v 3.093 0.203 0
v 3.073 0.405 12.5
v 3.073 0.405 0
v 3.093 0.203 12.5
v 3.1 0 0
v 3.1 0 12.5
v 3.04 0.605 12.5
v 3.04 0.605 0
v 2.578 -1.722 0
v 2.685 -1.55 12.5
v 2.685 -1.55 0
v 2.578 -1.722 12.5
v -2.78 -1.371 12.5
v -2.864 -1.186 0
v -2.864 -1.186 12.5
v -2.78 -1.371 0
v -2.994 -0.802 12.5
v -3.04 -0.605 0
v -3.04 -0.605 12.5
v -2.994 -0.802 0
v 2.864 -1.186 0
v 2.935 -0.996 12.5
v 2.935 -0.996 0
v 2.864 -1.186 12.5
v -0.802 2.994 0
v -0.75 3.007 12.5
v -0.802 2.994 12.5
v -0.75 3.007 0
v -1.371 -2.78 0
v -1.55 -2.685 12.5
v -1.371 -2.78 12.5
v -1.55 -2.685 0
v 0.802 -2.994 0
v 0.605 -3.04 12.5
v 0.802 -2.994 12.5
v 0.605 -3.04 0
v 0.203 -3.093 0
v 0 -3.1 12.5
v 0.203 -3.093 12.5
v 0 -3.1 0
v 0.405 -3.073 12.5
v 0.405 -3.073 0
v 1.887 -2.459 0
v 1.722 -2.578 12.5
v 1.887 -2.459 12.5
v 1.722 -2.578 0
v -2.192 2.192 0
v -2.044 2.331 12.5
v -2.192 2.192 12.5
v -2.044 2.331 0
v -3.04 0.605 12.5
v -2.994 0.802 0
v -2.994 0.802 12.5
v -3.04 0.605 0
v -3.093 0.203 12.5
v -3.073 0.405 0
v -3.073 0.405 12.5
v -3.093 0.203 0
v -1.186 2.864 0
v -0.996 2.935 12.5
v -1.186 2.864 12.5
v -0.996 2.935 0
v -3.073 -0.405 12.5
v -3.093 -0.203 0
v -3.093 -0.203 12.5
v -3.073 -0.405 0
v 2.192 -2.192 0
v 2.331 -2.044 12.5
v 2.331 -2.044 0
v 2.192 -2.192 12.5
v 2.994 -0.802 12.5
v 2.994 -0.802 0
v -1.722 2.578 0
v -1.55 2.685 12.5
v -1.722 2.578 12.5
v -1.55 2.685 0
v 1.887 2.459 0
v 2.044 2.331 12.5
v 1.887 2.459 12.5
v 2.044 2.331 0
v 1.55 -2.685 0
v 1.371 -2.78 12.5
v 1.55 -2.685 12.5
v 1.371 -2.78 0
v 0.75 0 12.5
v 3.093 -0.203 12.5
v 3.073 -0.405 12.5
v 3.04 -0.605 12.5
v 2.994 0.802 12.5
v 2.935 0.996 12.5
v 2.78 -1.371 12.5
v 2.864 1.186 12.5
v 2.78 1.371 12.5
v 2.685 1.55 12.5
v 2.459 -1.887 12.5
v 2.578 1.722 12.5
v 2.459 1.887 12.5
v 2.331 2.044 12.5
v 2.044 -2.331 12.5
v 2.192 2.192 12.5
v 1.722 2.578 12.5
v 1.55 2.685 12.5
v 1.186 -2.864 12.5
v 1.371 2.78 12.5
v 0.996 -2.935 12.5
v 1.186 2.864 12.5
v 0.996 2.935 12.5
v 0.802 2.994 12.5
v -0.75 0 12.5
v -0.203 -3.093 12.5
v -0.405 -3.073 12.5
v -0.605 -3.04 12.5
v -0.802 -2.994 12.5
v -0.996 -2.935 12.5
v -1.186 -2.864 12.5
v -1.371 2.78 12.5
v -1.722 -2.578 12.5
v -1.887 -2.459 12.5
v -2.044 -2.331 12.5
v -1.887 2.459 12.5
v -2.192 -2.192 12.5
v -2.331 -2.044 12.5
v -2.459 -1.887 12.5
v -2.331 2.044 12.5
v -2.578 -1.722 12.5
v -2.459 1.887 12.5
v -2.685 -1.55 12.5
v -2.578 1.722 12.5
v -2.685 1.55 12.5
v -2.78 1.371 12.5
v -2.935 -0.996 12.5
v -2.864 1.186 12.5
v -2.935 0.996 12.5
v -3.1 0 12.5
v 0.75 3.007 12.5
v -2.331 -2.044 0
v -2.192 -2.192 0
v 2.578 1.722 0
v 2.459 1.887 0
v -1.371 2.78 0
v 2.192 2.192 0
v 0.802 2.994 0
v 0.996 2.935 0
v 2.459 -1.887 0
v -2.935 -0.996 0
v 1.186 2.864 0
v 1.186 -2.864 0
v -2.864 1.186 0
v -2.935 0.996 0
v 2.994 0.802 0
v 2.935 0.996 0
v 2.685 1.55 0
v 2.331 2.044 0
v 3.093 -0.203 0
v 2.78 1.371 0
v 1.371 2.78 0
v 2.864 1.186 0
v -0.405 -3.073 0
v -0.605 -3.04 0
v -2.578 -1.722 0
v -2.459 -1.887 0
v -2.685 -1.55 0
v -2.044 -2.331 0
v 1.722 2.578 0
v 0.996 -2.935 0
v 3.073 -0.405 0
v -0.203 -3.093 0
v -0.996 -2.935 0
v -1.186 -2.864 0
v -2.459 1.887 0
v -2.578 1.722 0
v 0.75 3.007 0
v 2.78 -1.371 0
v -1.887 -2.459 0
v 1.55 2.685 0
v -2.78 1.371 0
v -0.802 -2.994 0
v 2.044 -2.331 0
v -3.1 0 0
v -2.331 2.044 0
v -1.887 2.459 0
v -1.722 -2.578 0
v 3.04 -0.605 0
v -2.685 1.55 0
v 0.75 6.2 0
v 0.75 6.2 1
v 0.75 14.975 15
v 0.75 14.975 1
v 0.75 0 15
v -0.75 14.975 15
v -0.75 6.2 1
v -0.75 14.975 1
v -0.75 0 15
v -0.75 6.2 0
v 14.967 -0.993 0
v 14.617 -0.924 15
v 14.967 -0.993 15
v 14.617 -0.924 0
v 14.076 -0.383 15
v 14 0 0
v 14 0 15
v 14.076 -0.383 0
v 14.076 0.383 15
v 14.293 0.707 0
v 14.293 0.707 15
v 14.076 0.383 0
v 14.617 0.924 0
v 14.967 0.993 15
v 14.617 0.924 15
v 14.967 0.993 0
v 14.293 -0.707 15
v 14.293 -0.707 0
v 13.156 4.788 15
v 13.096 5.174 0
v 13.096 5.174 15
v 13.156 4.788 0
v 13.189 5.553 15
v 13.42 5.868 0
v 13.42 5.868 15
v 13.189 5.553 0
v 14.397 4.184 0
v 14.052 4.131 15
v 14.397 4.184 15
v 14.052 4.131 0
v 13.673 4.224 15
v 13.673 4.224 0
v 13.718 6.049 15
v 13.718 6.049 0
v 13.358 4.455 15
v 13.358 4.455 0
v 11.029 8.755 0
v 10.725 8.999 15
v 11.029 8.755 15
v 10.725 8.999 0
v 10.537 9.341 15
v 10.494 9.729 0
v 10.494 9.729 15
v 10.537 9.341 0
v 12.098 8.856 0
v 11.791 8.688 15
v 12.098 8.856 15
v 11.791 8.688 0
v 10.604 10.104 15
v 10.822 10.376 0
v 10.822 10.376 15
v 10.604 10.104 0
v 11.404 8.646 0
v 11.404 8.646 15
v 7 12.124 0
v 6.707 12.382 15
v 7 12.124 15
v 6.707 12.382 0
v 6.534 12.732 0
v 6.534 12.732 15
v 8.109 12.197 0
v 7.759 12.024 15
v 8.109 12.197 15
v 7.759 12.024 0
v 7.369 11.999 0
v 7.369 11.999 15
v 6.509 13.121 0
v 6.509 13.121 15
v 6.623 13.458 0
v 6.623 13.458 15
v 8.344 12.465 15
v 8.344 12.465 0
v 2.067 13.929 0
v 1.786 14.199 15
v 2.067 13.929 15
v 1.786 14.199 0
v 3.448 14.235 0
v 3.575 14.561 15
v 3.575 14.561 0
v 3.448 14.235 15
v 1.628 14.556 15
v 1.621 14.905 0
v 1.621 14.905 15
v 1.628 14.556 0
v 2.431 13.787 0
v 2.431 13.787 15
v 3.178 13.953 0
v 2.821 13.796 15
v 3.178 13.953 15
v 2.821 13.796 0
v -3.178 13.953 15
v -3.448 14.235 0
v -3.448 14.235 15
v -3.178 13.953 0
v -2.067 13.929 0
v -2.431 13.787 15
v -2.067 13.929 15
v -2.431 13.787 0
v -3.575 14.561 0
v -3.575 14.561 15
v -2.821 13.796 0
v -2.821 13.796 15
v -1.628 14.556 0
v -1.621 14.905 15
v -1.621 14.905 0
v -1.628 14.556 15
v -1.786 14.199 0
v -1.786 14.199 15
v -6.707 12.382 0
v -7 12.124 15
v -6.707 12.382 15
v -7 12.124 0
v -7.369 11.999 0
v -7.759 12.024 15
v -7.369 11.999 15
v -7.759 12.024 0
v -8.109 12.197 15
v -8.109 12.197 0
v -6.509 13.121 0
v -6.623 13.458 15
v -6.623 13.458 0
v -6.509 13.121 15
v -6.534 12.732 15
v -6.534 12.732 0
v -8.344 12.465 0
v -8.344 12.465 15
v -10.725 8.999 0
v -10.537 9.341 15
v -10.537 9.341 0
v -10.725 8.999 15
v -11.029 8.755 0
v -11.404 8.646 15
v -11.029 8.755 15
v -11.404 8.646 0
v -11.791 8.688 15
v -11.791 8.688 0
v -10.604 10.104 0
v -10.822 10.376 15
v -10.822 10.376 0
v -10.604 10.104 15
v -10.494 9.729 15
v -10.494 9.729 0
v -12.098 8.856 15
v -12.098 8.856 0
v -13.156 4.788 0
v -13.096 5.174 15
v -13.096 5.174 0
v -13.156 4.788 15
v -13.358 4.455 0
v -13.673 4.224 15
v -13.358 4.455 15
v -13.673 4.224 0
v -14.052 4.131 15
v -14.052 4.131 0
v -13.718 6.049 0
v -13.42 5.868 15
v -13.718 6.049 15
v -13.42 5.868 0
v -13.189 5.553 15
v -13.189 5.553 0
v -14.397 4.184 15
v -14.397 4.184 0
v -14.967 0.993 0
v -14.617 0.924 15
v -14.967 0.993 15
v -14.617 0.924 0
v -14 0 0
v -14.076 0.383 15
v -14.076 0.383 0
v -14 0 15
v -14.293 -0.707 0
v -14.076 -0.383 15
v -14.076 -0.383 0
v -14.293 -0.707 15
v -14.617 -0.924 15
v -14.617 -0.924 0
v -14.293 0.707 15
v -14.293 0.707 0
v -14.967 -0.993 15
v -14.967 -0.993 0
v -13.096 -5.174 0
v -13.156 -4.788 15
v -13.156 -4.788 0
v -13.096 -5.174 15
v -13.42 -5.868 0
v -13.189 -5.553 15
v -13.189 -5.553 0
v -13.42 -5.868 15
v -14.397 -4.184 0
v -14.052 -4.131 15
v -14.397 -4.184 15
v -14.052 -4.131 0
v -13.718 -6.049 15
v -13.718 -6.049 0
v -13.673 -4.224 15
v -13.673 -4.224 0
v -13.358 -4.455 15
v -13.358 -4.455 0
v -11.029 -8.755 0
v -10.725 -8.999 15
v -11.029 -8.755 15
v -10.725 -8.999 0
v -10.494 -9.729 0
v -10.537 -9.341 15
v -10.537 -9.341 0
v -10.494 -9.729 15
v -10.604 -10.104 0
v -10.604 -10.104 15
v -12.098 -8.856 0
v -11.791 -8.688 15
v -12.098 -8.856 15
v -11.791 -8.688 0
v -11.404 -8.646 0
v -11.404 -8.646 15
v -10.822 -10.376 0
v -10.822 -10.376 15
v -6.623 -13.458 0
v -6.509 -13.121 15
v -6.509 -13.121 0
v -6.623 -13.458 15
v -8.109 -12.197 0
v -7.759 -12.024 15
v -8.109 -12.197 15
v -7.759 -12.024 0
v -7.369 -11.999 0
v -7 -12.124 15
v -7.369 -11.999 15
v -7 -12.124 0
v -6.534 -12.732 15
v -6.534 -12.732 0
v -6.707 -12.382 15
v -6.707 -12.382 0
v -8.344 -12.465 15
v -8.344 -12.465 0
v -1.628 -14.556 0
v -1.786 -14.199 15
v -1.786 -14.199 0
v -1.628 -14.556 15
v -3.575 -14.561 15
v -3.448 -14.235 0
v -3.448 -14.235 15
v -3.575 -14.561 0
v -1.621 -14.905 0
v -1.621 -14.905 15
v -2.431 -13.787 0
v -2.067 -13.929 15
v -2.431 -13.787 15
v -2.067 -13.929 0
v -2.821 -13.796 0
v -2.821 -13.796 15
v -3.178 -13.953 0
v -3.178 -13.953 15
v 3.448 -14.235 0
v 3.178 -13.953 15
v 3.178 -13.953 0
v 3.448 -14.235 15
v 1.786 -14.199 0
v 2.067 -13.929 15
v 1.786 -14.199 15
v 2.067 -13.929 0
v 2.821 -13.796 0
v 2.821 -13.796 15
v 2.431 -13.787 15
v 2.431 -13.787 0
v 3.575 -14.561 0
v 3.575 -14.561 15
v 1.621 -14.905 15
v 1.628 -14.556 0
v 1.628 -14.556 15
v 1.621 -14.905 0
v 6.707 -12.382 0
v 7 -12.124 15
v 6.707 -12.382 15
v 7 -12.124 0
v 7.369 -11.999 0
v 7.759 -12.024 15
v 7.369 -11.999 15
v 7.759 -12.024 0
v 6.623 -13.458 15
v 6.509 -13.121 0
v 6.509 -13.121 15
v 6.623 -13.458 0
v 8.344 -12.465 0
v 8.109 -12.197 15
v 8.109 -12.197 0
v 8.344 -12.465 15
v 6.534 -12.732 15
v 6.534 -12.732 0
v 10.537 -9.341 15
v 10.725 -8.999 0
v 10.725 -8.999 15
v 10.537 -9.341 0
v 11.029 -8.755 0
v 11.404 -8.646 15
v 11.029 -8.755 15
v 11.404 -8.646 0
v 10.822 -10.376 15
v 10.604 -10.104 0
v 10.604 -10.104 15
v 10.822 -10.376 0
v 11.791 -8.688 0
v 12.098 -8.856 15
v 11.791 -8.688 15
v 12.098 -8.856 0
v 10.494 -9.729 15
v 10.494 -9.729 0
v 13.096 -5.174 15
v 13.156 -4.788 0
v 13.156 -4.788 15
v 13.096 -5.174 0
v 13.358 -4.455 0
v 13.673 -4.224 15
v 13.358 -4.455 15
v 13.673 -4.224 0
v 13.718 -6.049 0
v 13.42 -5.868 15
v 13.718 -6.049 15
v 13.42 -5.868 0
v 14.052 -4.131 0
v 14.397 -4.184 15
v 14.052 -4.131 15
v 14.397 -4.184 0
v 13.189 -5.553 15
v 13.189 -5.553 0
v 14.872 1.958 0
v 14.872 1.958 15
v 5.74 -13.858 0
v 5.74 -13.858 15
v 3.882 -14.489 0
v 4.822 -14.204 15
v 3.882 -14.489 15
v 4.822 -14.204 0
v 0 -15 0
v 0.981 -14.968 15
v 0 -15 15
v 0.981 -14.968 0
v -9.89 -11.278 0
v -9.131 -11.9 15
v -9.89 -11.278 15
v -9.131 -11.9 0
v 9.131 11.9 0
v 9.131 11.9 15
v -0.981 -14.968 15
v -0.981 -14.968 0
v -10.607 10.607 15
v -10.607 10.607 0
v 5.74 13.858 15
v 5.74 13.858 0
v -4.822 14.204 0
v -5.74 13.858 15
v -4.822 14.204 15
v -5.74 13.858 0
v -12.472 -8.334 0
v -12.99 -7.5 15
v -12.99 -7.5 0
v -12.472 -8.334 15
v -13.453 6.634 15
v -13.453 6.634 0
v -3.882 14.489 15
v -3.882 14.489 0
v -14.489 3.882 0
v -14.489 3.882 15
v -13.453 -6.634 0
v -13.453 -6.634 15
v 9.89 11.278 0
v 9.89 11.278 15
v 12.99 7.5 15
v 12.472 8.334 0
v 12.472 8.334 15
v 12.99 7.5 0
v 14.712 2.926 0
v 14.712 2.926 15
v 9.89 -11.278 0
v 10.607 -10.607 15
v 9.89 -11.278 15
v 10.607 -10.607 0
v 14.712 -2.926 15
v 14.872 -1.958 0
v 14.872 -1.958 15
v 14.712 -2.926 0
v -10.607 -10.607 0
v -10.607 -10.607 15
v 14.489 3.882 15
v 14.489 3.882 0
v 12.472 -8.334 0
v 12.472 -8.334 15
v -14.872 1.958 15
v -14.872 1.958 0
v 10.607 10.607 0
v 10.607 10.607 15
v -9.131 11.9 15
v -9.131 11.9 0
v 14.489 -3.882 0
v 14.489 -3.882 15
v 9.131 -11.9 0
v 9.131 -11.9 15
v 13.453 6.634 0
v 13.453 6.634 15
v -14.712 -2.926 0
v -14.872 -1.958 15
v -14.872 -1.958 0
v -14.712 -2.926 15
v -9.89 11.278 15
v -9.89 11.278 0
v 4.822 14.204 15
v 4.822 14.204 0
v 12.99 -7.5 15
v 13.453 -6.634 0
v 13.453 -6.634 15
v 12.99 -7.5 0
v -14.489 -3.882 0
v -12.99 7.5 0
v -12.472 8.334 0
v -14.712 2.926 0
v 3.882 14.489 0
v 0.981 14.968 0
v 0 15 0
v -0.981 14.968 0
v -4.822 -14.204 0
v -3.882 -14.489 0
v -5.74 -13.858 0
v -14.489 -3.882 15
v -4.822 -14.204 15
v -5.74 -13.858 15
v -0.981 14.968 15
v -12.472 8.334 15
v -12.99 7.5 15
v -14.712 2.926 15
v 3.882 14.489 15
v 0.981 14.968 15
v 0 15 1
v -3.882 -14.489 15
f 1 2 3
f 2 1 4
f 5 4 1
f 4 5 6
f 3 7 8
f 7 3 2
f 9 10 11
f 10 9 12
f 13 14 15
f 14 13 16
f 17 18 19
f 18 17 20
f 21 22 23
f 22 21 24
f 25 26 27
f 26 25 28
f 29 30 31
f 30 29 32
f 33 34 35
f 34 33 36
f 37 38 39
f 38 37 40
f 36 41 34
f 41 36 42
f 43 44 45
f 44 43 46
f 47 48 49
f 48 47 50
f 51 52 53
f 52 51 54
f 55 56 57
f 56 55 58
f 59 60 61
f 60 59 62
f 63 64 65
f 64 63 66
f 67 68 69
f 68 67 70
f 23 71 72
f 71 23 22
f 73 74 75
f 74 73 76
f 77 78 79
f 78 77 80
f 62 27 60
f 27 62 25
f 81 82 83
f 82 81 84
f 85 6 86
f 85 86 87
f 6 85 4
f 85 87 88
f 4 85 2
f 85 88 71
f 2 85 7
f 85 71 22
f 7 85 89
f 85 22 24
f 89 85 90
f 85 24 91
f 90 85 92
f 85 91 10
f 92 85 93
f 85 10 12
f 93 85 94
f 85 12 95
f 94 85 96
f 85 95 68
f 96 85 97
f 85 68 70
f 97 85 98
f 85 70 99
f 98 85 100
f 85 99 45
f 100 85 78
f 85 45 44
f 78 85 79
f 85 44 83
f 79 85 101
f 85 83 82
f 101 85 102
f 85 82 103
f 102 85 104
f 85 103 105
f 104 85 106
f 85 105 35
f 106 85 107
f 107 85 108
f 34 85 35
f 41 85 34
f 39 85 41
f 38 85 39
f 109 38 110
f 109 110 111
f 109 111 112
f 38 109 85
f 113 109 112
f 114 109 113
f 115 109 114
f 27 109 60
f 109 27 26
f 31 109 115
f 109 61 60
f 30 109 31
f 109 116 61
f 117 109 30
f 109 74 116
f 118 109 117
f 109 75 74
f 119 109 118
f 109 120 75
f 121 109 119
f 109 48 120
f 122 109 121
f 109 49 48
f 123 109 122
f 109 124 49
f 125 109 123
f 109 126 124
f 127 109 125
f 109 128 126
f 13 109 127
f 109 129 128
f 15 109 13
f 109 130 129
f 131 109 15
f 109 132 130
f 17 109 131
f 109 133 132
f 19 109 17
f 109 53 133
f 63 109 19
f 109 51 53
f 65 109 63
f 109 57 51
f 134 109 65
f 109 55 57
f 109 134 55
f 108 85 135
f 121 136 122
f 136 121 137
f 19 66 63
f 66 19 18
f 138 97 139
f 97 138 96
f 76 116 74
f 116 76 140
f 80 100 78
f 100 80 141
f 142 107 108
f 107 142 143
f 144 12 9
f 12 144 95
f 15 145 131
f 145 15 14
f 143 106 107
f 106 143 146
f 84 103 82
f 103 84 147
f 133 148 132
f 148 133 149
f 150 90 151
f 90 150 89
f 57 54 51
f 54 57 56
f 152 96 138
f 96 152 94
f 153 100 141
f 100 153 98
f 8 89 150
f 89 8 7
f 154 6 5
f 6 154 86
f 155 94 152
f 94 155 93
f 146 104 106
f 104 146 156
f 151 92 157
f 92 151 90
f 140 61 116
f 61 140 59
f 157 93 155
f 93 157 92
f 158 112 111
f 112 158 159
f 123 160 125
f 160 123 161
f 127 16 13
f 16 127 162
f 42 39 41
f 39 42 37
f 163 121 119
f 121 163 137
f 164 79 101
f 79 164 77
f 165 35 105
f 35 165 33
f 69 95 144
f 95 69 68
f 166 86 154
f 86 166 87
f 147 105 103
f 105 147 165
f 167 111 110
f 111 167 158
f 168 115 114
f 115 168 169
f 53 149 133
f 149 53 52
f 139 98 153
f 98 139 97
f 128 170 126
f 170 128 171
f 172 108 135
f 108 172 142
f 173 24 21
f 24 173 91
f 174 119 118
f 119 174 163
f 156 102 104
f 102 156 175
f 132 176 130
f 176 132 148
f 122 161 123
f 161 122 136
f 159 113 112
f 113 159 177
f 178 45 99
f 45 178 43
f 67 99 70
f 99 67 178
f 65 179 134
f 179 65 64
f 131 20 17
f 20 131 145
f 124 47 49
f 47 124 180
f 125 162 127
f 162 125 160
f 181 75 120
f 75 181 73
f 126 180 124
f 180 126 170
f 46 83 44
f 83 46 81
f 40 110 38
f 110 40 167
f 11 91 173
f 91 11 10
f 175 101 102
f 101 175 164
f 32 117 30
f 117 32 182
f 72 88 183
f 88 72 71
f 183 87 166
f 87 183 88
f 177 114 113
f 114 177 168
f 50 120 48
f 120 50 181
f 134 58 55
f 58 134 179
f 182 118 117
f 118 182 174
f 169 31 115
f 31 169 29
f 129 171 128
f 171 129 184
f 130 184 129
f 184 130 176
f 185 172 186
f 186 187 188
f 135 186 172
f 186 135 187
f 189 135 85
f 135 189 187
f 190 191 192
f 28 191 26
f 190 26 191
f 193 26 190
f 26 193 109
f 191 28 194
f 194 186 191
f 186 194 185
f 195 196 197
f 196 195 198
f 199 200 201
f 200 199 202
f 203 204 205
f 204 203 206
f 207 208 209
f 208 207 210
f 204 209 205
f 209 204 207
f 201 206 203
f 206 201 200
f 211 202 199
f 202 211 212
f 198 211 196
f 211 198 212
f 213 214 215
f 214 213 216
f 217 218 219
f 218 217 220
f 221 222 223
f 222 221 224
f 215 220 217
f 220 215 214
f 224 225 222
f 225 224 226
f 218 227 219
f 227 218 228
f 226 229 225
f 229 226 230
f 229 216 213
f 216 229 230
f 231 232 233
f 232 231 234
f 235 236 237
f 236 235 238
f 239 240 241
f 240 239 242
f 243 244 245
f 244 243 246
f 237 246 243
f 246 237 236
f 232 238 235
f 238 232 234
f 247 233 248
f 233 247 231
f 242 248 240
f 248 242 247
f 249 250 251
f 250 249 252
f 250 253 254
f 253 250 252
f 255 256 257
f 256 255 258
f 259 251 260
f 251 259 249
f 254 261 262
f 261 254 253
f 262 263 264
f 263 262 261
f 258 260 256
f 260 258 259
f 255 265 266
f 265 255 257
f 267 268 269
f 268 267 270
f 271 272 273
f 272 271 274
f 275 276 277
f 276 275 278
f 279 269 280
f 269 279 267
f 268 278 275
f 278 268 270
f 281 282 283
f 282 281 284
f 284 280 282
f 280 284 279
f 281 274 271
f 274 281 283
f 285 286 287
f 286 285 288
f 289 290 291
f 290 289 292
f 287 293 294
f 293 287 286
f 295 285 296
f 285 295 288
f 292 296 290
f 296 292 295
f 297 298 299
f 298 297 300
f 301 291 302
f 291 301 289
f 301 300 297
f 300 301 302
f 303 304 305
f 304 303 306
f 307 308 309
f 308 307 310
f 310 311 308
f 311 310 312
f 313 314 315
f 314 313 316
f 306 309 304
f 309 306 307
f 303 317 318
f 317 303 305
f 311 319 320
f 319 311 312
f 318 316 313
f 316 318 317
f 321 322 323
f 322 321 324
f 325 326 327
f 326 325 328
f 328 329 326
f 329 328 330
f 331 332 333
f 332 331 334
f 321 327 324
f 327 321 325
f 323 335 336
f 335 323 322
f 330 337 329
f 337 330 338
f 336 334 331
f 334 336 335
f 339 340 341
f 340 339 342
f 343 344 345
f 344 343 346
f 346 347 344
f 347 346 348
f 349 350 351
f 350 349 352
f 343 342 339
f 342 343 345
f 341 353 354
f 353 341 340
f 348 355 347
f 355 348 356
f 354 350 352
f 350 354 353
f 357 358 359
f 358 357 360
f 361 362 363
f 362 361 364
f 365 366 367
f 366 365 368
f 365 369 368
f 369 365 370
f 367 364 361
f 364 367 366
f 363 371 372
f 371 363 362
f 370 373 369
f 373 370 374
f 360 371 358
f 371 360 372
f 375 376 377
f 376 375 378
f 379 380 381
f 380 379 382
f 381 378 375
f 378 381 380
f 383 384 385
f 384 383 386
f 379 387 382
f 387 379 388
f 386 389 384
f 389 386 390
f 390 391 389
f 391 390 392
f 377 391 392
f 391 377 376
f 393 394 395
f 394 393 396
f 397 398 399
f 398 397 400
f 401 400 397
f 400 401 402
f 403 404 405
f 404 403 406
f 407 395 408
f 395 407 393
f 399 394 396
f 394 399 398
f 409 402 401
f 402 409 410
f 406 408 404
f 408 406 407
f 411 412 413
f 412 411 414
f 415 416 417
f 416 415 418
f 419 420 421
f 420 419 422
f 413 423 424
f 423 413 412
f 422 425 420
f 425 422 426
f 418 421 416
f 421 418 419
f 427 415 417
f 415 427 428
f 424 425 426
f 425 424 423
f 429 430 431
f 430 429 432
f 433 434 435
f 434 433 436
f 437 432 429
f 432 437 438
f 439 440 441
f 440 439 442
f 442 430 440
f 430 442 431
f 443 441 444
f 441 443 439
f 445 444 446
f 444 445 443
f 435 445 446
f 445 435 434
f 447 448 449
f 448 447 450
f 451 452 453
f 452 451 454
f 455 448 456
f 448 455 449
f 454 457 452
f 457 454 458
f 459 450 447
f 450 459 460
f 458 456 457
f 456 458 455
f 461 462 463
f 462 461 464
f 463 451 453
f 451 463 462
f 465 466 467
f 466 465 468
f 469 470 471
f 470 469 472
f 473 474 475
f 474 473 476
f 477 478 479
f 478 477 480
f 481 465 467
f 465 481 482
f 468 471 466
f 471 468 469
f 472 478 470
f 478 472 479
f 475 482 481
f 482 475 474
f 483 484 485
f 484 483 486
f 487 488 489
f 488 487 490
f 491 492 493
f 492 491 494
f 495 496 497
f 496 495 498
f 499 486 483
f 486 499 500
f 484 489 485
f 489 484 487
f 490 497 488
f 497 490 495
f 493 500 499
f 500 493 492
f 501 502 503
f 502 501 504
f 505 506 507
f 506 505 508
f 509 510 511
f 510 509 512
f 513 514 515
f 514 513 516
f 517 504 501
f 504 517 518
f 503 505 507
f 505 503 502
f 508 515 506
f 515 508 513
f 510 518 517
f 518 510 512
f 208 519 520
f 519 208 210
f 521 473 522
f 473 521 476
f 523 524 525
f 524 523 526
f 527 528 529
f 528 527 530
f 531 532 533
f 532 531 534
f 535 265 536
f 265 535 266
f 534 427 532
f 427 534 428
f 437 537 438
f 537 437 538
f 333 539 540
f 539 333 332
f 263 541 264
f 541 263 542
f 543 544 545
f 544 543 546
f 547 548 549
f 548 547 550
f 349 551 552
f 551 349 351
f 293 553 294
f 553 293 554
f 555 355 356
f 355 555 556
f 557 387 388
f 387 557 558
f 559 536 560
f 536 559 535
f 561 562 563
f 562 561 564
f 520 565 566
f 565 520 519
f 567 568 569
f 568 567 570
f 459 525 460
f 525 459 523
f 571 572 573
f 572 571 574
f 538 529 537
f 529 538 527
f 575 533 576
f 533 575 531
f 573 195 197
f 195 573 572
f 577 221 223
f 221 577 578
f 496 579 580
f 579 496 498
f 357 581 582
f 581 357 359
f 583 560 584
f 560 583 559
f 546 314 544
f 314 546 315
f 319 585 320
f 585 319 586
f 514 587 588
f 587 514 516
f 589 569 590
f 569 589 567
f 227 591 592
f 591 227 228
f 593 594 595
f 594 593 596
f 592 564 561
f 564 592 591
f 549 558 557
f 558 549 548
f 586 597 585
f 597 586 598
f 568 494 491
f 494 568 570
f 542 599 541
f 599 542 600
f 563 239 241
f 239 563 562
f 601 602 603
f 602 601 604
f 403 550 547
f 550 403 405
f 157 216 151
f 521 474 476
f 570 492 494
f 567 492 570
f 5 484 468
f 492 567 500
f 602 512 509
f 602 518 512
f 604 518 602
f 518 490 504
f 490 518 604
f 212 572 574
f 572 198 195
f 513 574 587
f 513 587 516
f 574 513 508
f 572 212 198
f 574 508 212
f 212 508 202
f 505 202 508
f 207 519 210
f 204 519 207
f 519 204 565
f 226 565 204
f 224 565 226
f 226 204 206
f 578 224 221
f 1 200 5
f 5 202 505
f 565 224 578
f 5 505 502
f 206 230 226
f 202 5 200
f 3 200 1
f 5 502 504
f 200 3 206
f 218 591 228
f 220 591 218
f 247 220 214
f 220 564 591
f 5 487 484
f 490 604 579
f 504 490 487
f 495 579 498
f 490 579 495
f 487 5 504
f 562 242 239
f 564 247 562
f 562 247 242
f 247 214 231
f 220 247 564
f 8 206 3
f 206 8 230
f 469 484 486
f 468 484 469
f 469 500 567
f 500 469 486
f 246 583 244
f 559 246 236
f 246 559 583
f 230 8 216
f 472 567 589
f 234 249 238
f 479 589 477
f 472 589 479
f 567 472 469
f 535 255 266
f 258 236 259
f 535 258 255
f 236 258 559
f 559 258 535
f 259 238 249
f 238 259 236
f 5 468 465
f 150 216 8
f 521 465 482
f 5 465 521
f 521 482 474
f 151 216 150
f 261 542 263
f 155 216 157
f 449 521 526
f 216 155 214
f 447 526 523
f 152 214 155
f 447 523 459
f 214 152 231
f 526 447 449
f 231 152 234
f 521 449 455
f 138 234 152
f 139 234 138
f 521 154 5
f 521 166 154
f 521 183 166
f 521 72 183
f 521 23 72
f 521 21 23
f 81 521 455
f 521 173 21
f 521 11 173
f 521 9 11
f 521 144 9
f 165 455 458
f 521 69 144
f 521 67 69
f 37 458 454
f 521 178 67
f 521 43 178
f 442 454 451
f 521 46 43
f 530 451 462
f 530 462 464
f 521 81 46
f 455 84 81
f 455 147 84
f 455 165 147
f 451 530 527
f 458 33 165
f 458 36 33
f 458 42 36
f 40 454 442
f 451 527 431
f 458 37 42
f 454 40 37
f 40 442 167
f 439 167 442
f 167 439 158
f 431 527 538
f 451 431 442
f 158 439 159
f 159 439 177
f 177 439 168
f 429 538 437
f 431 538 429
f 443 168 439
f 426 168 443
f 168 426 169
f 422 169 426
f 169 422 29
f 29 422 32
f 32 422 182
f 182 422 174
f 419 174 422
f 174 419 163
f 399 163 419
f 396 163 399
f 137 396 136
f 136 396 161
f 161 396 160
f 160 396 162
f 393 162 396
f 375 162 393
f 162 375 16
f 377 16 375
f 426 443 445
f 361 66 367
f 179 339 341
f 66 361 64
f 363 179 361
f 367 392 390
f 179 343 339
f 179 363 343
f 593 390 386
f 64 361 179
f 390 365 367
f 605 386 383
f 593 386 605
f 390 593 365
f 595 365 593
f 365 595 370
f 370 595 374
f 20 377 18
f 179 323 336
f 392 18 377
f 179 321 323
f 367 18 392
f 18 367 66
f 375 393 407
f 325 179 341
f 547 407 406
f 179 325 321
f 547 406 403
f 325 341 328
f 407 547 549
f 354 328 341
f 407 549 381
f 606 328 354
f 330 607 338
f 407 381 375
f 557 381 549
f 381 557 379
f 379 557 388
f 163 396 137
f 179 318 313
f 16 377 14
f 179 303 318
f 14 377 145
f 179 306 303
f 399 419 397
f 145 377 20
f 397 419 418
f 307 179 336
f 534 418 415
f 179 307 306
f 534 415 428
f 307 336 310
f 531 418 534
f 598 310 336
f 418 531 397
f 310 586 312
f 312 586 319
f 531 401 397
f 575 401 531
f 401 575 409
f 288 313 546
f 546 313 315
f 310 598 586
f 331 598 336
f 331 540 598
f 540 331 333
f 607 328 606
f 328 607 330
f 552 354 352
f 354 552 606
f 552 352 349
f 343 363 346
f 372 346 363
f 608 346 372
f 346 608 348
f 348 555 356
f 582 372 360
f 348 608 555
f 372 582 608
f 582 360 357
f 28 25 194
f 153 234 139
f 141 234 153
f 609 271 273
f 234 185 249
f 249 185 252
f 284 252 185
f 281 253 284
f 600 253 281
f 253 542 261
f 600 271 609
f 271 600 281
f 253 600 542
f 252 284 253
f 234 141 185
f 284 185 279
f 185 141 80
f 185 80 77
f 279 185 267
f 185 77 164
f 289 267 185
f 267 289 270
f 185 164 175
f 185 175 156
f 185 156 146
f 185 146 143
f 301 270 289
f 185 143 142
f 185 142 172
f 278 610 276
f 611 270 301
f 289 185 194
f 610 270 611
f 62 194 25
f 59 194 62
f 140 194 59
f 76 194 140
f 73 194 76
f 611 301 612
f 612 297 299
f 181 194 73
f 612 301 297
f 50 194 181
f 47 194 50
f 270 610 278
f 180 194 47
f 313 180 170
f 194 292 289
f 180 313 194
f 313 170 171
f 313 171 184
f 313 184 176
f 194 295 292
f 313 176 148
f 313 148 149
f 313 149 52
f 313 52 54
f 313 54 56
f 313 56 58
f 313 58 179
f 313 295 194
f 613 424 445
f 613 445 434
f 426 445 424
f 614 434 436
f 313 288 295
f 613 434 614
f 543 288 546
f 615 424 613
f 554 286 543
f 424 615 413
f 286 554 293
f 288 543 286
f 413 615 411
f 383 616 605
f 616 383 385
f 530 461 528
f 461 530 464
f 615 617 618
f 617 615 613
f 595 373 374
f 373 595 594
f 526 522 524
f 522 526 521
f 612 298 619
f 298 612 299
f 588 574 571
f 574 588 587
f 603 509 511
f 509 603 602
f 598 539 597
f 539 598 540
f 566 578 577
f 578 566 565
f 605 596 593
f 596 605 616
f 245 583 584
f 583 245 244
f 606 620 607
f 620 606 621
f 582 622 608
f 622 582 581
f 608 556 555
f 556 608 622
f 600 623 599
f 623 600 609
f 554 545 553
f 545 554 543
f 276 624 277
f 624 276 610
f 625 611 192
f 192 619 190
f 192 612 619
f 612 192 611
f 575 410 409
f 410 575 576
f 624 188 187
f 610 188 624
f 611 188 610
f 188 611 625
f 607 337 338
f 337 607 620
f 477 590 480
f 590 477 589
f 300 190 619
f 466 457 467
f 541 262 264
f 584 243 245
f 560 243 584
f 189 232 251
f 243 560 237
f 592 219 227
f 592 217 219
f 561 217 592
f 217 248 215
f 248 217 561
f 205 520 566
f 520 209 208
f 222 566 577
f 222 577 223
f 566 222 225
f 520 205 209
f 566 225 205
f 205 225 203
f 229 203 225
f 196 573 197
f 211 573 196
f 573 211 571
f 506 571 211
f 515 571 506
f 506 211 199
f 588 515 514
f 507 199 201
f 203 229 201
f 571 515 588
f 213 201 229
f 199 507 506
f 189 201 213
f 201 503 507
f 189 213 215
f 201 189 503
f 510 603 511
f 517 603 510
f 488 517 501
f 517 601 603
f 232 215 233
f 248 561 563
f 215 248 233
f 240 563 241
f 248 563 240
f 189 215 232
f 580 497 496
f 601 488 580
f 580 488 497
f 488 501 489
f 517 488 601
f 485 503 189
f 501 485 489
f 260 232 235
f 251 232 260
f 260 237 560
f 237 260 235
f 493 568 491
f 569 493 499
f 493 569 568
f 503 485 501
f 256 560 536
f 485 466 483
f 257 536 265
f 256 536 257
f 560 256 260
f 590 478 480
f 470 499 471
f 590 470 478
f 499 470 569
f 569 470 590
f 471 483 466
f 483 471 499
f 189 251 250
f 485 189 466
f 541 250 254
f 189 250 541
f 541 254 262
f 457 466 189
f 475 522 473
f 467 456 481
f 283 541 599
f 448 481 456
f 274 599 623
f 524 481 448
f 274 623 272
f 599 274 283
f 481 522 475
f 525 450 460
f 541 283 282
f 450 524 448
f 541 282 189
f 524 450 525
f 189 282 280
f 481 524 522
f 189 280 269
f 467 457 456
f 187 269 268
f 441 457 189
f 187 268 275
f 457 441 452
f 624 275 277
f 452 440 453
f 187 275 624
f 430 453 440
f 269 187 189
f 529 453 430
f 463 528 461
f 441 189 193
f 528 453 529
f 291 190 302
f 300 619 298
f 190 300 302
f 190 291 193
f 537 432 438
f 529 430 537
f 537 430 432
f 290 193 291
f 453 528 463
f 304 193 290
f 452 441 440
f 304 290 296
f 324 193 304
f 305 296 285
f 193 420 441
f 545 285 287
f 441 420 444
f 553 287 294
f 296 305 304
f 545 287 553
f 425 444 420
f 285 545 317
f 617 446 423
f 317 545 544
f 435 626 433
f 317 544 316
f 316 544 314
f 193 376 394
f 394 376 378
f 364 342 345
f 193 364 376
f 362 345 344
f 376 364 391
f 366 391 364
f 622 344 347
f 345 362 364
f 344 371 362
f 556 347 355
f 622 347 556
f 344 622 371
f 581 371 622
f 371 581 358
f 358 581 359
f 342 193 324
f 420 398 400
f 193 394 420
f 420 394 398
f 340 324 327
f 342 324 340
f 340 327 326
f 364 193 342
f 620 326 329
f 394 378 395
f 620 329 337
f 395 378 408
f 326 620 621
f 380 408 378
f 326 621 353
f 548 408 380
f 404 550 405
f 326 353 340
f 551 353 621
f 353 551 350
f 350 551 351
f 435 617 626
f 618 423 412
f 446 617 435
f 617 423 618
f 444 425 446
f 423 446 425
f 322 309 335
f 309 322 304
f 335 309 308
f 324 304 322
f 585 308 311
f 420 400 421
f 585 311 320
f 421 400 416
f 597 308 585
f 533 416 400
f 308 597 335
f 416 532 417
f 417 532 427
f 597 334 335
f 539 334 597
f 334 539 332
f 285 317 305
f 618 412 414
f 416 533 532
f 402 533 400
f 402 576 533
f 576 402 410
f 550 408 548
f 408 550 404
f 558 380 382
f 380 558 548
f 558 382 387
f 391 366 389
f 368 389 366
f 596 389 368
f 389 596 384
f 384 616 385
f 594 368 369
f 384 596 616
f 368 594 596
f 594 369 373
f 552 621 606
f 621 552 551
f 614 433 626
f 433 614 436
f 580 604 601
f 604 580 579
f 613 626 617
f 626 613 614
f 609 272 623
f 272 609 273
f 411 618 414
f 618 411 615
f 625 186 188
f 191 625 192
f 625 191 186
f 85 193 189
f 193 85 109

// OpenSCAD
// Replacement knob for hotplate stirrer (D-shaft 6 mm)
// Print orientation: bottom face (with D-bore) on bed at z = 0

$fn = 96;

// --- Knob body ---
knob_d      = 30;   // outer diameter
knob_h      = 15;   // height

// --- D-shaped blind bore ---
bore_d      = 6.2;  // circle diameter
bore_flat   = 4.7;  // distance from flat to opposite side of circle
bore_depth  = 12;   // depth from bottom face

// --- Grip grooves ---
groove_n    = 18;   // number of grooves
groove_d    = 2;    // groove diameter (half-cylinder)

// --- Pointer groove ---
pointer_w   = 1.5;  // groove width
pointer_d   = 1;    // groove depth

// Derived
bore_r = bore_d / 2;
eps    = 0.5;       // overcut for clean differences

difference() {
    // Main body, centred in XY, sitting on z = 0
    cylinder(d = knob_d, h = knob_h);

    // D-bore: circle with one side cut flat, extended past bottom and top faces
    translate([0, 0, -eps])
        union() {
            cylinder(r = bore_r, h = bore_depth + 2 * eps);
            translate([-(bore_d - bore_flat) / 2, 0, 0])
                cube([bore_d - bore_flat, bore_d, bore_depth + 2 * eps]);
        }

    // Vertical grip grooves along full height, centred on outer surface
    for (i = [0 : groove_n - 1])
        rotate([0, 0, i * 360 / groove_n])
            translate([knob_d / 2, 0, -eps])
                cylinder(d = groove_d, h = knob_h + 2 * eps, $fn = 16);

    // Pointer groove from centre to outer edge, same side as D-flat
    translate([-pointer_w / 2, 0, pointer_d])
        cube([pointer_w, knob_d / 2 + 1, knob_h - pointer_d]);
}
